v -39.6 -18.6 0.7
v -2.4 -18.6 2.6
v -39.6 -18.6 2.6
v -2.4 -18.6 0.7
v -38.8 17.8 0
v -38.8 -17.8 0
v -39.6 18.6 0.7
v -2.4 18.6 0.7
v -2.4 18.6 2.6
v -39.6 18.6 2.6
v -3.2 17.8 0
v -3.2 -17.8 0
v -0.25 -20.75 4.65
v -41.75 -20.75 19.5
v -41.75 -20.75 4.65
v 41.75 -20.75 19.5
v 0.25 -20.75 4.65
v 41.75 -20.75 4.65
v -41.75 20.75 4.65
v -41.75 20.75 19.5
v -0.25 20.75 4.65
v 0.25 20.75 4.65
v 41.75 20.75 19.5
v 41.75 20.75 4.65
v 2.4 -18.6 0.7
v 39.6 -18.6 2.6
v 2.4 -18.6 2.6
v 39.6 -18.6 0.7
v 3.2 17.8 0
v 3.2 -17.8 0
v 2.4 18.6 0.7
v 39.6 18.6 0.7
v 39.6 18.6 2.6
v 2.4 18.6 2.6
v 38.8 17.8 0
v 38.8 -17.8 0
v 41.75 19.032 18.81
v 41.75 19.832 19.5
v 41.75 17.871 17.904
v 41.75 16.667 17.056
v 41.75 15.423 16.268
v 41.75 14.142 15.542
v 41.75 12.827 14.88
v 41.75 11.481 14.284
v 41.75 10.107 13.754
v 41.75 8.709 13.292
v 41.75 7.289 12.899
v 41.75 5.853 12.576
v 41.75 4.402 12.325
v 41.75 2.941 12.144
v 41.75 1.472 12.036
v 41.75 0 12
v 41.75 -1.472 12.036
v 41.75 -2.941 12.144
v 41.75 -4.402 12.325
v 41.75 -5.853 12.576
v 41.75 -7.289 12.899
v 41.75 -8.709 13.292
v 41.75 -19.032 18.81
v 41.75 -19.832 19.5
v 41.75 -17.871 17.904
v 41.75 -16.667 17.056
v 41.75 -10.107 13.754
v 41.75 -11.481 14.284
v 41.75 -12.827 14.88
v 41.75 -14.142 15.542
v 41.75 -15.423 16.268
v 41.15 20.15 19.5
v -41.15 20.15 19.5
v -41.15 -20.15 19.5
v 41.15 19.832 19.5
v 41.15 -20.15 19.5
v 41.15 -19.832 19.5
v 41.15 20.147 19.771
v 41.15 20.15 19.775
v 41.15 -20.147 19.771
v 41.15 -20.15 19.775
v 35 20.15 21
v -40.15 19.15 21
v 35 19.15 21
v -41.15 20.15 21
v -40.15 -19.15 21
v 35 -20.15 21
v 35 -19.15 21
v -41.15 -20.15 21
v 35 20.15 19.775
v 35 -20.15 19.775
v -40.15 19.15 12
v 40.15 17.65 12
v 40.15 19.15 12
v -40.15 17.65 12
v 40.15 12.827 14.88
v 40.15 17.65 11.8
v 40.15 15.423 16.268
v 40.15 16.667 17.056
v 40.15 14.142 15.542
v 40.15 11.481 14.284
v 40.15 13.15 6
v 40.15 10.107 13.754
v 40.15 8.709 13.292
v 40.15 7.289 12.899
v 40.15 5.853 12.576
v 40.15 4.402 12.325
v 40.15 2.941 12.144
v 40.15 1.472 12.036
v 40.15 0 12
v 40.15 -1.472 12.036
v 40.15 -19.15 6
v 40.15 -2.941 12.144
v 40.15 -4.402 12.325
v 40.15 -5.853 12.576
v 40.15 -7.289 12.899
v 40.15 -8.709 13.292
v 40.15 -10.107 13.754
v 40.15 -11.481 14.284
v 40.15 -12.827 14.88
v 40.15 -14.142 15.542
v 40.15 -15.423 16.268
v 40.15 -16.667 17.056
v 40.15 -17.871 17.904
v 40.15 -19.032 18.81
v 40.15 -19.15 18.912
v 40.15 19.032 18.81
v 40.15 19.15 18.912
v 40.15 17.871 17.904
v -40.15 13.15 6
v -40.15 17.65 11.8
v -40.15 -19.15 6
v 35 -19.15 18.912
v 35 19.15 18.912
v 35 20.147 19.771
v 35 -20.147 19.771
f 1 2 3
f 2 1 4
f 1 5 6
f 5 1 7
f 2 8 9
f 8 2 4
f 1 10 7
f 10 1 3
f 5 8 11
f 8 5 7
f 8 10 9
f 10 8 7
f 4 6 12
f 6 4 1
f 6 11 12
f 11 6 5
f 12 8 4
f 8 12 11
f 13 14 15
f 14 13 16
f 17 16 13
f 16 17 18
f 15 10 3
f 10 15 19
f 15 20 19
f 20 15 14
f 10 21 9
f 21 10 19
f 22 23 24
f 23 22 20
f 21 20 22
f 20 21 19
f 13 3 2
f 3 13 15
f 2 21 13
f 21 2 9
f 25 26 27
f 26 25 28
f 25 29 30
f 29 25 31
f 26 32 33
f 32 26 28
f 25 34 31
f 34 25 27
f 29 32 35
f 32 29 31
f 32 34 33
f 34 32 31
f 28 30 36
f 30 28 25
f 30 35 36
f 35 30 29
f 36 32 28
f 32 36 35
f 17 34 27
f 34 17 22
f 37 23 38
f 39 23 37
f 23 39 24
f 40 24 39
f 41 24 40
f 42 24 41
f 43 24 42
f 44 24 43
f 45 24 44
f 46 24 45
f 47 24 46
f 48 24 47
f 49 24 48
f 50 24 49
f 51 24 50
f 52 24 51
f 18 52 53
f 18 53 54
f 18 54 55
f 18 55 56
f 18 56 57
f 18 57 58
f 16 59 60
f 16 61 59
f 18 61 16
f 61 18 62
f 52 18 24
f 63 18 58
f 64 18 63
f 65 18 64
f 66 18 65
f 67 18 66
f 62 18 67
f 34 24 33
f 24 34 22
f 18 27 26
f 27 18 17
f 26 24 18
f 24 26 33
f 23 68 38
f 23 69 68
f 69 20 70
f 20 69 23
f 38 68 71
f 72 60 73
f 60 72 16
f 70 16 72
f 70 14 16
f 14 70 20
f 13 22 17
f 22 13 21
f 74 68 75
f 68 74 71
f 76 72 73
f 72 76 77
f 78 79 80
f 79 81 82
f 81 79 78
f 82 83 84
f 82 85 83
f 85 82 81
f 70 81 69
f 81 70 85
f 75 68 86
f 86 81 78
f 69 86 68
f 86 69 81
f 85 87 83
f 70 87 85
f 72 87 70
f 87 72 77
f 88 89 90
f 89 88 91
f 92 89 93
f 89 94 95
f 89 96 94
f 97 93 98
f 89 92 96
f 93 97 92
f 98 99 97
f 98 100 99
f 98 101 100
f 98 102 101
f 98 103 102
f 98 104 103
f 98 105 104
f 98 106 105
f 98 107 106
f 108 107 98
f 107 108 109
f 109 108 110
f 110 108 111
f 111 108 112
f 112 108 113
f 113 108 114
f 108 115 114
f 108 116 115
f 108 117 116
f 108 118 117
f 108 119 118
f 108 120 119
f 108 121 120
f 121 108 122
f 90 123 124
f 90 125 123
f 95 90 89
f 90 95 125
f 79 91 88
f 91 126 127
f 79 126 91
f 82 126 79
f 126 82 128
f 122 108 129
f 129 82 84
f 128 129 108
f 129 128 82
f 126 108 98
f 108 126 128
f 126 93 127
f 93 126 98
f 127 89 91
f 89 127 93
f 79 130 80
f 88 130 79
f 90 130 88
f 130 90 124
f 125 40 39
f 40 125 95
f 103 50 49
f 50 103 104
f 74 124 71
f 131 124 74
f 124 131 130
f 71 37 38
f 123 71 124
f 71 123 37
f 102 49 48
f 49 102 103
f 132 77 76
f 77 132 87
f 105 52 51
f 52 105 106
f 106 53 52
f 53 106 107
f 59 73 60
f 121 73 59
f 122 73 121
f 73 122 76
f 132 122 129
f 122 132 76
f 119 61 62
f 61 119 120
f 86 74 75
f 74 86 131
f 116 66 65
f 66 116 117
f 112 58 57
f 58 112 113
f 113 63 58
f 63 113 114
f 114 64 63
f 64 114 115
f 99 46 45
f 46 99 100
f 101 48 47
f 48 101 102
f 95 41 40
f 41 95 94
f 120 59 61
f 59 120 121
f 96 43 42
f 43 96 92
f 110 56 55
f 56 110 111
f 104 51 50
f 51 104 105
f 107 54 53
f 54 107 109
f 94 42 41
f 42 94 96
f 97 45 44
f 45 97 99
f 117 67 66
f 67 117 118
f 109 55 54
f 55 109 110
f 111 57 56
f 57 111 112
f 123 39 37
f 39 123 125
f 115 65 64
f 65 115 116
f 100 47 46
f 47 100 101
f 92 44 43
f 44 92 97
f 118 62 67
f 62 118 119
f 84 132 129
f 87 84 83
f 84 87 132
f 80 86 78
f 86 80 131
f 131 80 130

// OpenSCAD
// Gridfinity bin, 2x1 x 3U tall
// Outside 83.5 x 41.5 mm, height 21 mm (3x7mm), PLA, 0.4mm nozzle, no supports
// Print orientation: +Z up, bottom (foot bottoms) on bed at z=0

Lx = 83.5;
Ly = 41.5;
H = 21;
foot_z0 = 0;
foot_z1 = 0.8;
foot_z2 = 2.6;   // 0.8+1.8
foot_z3 = 4.75;  // 0.8+1.8+2.15
foot_btm = 35.6; // 41.5-5.9
foot_mid = 37.2; // 35.6+1.6
foot_top = 41.5;
wall_t = 1.6;
floor_z = 6.0;
lip_z = 19.5;
lip_inset = 0.6;

echo(cadverify_spec = [
    ["bounds", [[-41.75, -20.75, 0], [41.75, 20.75, 21]]],
    ["bodies", 1],
    ["through_holes", 0],
    ["support_faces", [["bed", "-z", 2000]]],
    ["overhangs_allowed", [
        ["standard Gridfinity foot lower 45-degree chamfer left", [[-40, -19, -0.1], [-2, 19, 0.8]]],
        ["standard Gridfinity foot lower 45-degree chamfer right", [[2, -19, -0.1], [40, 19, 0.8]]],
        ["standard Gridfinity foot upper 45-degree taper", [[-42, -21, 2.5], [42, 21, 4.75]]]
    ]],
    ["copies", 1],
    ["details", [
        ["foot_left", "material", [[-30, -10, 0.1], [-12, 10, 0.7]], 0.9],
        ["foot_right", "material", [[12, -10, 0.1], [30, 10, 0.7]], 0.9],
        ["stack_lip", "material", [[-20, 19.3, 19.6], [20, 20.0, 20.9]], 0.9],
        ["label_shelf", "material", [[-30, 16, 6.5], [30, 18.5, 8]], 0.9],
        ["scoop_void", "void", [[40.5, -10, 14], [42.5, 10, 20]], 0.9],
        ["wall_side", "thickness", [38, 22, 16], [0, -1, 0], 1.6],
        ["floor", "thickness", [-21, 0, -5], [0, 0, 1], 6.0],
        ["foot_profile", "view", [[-39, -18, 0], [-3, 18, 5]]],
        ["scoop_view", "view", [[35, -15, 10], [43, 15, 22]]],
        ["label_view", "view", [[-10, 12, 6], [10, 20, 13]]],
        ["lip_view", "view", [[-15, 18.5, 18.5], [15, 21, 21.5]]]
    ]]
]);

module foot(cx) {
    translate([cx, 0, 0]) {
        // bottom 45deg frustum: 35.6 -> 37.2 over 0.8
        hull() {
            translate([-foot_btm/2, -foot_btm/2, 0]) cube([foot_btm, foot_btm, 0.1]);
            translate([-foot_mid/2, -foot_mid/2, foot_z1-0.1]) cube([foot_mid, foot_mid, 0.1]);
        }
        // vertical 1.8
        translate([-foot_mid/2, -foot_mid/2, foot_z1]) cube([foot_mid, foot_mid, foot_z2-foot_z1]);
        // top 45deg frustum: 37.2 -> 41.5 over 2.15
        hull() {
            translate([-foot_mid/2, -foot_mid/2, foot_z2]) cube([foot_mid, foot_mid, 0.1]);
            translate([-foot_top/2, -foot_top/2, foot_z3-0.1]) cube([foot_top, foot_top, 0.1]);
        }
    }
}

module bin_solid() {
    foot(-21);
    foot(21);
    // main outer body, overlap feet top by 0.1
    translate([-Lx/2, -Ly/2, foot_z3-0.1]) cube([Lx, Ly, lip_z-(foot_z3-0.1)]);
    // stacking lip: stepped inward 0.6 per side, no overhang
    translate([-(Lx-2*lip_inset)/2, -(Ly-2*lip_inset)/2, lip_z]) cube([Lx-2*lip_inset, Ly-2*lip_inset, H-lip_z]);
    // label shelf wedge along +Y inside, sits on floor against wall
    // y_in=19.15, bottom from 13.15 to 19.35, top from 17.65 to 19.35
    hull() {
        translate([-35, 13.15, 5.9]) cube([70, 19.35-13.15, 0.2]);
        translate([-35, 17.65, 11.9]) cube([70, 19.35-17.65, 0.2]);
    }
}

module bin() {
    x_in = (Lx-2*wall_t)/2;
    y_in0 = -(Ly-2*wall_t)/2;
    y_in1 = (Ly-2*wall_t)/2;
    shelf_y0 = 13.15;
    shelf_y1 = 17.65;
    shelf_z0 = 6.0;
    shelf_z1 = 12.0;
    difference() {
        bin_solid();
        // lower cavity, fronted by label shelf slope on +Y
        hull() {
            translate([-x_in, y_in0, shelf_z0]) cube([2*x_in, shelf_y0-y_in0, 0.2]);
            translate([-x_in, y_in0, shelf_z1-0.2]) cube([2*x_in, shelf_y1-y_in0, 0.2]);
        }
        // upper cavity full width
        translate([-x_in, y_in0, shelf_z1]) cube([2*x_in, y_in1-y_in0, H-shelf_z1+1]);
        // scoop at +X front: cylinder axis X, R30 center z42 -> bottom 12 at center
        translate([41.0, 0, 42]) rotate([0, 90, 0]) cylinder(r=30, h=12, center=true, $fn=128);
    }
}

bin();
